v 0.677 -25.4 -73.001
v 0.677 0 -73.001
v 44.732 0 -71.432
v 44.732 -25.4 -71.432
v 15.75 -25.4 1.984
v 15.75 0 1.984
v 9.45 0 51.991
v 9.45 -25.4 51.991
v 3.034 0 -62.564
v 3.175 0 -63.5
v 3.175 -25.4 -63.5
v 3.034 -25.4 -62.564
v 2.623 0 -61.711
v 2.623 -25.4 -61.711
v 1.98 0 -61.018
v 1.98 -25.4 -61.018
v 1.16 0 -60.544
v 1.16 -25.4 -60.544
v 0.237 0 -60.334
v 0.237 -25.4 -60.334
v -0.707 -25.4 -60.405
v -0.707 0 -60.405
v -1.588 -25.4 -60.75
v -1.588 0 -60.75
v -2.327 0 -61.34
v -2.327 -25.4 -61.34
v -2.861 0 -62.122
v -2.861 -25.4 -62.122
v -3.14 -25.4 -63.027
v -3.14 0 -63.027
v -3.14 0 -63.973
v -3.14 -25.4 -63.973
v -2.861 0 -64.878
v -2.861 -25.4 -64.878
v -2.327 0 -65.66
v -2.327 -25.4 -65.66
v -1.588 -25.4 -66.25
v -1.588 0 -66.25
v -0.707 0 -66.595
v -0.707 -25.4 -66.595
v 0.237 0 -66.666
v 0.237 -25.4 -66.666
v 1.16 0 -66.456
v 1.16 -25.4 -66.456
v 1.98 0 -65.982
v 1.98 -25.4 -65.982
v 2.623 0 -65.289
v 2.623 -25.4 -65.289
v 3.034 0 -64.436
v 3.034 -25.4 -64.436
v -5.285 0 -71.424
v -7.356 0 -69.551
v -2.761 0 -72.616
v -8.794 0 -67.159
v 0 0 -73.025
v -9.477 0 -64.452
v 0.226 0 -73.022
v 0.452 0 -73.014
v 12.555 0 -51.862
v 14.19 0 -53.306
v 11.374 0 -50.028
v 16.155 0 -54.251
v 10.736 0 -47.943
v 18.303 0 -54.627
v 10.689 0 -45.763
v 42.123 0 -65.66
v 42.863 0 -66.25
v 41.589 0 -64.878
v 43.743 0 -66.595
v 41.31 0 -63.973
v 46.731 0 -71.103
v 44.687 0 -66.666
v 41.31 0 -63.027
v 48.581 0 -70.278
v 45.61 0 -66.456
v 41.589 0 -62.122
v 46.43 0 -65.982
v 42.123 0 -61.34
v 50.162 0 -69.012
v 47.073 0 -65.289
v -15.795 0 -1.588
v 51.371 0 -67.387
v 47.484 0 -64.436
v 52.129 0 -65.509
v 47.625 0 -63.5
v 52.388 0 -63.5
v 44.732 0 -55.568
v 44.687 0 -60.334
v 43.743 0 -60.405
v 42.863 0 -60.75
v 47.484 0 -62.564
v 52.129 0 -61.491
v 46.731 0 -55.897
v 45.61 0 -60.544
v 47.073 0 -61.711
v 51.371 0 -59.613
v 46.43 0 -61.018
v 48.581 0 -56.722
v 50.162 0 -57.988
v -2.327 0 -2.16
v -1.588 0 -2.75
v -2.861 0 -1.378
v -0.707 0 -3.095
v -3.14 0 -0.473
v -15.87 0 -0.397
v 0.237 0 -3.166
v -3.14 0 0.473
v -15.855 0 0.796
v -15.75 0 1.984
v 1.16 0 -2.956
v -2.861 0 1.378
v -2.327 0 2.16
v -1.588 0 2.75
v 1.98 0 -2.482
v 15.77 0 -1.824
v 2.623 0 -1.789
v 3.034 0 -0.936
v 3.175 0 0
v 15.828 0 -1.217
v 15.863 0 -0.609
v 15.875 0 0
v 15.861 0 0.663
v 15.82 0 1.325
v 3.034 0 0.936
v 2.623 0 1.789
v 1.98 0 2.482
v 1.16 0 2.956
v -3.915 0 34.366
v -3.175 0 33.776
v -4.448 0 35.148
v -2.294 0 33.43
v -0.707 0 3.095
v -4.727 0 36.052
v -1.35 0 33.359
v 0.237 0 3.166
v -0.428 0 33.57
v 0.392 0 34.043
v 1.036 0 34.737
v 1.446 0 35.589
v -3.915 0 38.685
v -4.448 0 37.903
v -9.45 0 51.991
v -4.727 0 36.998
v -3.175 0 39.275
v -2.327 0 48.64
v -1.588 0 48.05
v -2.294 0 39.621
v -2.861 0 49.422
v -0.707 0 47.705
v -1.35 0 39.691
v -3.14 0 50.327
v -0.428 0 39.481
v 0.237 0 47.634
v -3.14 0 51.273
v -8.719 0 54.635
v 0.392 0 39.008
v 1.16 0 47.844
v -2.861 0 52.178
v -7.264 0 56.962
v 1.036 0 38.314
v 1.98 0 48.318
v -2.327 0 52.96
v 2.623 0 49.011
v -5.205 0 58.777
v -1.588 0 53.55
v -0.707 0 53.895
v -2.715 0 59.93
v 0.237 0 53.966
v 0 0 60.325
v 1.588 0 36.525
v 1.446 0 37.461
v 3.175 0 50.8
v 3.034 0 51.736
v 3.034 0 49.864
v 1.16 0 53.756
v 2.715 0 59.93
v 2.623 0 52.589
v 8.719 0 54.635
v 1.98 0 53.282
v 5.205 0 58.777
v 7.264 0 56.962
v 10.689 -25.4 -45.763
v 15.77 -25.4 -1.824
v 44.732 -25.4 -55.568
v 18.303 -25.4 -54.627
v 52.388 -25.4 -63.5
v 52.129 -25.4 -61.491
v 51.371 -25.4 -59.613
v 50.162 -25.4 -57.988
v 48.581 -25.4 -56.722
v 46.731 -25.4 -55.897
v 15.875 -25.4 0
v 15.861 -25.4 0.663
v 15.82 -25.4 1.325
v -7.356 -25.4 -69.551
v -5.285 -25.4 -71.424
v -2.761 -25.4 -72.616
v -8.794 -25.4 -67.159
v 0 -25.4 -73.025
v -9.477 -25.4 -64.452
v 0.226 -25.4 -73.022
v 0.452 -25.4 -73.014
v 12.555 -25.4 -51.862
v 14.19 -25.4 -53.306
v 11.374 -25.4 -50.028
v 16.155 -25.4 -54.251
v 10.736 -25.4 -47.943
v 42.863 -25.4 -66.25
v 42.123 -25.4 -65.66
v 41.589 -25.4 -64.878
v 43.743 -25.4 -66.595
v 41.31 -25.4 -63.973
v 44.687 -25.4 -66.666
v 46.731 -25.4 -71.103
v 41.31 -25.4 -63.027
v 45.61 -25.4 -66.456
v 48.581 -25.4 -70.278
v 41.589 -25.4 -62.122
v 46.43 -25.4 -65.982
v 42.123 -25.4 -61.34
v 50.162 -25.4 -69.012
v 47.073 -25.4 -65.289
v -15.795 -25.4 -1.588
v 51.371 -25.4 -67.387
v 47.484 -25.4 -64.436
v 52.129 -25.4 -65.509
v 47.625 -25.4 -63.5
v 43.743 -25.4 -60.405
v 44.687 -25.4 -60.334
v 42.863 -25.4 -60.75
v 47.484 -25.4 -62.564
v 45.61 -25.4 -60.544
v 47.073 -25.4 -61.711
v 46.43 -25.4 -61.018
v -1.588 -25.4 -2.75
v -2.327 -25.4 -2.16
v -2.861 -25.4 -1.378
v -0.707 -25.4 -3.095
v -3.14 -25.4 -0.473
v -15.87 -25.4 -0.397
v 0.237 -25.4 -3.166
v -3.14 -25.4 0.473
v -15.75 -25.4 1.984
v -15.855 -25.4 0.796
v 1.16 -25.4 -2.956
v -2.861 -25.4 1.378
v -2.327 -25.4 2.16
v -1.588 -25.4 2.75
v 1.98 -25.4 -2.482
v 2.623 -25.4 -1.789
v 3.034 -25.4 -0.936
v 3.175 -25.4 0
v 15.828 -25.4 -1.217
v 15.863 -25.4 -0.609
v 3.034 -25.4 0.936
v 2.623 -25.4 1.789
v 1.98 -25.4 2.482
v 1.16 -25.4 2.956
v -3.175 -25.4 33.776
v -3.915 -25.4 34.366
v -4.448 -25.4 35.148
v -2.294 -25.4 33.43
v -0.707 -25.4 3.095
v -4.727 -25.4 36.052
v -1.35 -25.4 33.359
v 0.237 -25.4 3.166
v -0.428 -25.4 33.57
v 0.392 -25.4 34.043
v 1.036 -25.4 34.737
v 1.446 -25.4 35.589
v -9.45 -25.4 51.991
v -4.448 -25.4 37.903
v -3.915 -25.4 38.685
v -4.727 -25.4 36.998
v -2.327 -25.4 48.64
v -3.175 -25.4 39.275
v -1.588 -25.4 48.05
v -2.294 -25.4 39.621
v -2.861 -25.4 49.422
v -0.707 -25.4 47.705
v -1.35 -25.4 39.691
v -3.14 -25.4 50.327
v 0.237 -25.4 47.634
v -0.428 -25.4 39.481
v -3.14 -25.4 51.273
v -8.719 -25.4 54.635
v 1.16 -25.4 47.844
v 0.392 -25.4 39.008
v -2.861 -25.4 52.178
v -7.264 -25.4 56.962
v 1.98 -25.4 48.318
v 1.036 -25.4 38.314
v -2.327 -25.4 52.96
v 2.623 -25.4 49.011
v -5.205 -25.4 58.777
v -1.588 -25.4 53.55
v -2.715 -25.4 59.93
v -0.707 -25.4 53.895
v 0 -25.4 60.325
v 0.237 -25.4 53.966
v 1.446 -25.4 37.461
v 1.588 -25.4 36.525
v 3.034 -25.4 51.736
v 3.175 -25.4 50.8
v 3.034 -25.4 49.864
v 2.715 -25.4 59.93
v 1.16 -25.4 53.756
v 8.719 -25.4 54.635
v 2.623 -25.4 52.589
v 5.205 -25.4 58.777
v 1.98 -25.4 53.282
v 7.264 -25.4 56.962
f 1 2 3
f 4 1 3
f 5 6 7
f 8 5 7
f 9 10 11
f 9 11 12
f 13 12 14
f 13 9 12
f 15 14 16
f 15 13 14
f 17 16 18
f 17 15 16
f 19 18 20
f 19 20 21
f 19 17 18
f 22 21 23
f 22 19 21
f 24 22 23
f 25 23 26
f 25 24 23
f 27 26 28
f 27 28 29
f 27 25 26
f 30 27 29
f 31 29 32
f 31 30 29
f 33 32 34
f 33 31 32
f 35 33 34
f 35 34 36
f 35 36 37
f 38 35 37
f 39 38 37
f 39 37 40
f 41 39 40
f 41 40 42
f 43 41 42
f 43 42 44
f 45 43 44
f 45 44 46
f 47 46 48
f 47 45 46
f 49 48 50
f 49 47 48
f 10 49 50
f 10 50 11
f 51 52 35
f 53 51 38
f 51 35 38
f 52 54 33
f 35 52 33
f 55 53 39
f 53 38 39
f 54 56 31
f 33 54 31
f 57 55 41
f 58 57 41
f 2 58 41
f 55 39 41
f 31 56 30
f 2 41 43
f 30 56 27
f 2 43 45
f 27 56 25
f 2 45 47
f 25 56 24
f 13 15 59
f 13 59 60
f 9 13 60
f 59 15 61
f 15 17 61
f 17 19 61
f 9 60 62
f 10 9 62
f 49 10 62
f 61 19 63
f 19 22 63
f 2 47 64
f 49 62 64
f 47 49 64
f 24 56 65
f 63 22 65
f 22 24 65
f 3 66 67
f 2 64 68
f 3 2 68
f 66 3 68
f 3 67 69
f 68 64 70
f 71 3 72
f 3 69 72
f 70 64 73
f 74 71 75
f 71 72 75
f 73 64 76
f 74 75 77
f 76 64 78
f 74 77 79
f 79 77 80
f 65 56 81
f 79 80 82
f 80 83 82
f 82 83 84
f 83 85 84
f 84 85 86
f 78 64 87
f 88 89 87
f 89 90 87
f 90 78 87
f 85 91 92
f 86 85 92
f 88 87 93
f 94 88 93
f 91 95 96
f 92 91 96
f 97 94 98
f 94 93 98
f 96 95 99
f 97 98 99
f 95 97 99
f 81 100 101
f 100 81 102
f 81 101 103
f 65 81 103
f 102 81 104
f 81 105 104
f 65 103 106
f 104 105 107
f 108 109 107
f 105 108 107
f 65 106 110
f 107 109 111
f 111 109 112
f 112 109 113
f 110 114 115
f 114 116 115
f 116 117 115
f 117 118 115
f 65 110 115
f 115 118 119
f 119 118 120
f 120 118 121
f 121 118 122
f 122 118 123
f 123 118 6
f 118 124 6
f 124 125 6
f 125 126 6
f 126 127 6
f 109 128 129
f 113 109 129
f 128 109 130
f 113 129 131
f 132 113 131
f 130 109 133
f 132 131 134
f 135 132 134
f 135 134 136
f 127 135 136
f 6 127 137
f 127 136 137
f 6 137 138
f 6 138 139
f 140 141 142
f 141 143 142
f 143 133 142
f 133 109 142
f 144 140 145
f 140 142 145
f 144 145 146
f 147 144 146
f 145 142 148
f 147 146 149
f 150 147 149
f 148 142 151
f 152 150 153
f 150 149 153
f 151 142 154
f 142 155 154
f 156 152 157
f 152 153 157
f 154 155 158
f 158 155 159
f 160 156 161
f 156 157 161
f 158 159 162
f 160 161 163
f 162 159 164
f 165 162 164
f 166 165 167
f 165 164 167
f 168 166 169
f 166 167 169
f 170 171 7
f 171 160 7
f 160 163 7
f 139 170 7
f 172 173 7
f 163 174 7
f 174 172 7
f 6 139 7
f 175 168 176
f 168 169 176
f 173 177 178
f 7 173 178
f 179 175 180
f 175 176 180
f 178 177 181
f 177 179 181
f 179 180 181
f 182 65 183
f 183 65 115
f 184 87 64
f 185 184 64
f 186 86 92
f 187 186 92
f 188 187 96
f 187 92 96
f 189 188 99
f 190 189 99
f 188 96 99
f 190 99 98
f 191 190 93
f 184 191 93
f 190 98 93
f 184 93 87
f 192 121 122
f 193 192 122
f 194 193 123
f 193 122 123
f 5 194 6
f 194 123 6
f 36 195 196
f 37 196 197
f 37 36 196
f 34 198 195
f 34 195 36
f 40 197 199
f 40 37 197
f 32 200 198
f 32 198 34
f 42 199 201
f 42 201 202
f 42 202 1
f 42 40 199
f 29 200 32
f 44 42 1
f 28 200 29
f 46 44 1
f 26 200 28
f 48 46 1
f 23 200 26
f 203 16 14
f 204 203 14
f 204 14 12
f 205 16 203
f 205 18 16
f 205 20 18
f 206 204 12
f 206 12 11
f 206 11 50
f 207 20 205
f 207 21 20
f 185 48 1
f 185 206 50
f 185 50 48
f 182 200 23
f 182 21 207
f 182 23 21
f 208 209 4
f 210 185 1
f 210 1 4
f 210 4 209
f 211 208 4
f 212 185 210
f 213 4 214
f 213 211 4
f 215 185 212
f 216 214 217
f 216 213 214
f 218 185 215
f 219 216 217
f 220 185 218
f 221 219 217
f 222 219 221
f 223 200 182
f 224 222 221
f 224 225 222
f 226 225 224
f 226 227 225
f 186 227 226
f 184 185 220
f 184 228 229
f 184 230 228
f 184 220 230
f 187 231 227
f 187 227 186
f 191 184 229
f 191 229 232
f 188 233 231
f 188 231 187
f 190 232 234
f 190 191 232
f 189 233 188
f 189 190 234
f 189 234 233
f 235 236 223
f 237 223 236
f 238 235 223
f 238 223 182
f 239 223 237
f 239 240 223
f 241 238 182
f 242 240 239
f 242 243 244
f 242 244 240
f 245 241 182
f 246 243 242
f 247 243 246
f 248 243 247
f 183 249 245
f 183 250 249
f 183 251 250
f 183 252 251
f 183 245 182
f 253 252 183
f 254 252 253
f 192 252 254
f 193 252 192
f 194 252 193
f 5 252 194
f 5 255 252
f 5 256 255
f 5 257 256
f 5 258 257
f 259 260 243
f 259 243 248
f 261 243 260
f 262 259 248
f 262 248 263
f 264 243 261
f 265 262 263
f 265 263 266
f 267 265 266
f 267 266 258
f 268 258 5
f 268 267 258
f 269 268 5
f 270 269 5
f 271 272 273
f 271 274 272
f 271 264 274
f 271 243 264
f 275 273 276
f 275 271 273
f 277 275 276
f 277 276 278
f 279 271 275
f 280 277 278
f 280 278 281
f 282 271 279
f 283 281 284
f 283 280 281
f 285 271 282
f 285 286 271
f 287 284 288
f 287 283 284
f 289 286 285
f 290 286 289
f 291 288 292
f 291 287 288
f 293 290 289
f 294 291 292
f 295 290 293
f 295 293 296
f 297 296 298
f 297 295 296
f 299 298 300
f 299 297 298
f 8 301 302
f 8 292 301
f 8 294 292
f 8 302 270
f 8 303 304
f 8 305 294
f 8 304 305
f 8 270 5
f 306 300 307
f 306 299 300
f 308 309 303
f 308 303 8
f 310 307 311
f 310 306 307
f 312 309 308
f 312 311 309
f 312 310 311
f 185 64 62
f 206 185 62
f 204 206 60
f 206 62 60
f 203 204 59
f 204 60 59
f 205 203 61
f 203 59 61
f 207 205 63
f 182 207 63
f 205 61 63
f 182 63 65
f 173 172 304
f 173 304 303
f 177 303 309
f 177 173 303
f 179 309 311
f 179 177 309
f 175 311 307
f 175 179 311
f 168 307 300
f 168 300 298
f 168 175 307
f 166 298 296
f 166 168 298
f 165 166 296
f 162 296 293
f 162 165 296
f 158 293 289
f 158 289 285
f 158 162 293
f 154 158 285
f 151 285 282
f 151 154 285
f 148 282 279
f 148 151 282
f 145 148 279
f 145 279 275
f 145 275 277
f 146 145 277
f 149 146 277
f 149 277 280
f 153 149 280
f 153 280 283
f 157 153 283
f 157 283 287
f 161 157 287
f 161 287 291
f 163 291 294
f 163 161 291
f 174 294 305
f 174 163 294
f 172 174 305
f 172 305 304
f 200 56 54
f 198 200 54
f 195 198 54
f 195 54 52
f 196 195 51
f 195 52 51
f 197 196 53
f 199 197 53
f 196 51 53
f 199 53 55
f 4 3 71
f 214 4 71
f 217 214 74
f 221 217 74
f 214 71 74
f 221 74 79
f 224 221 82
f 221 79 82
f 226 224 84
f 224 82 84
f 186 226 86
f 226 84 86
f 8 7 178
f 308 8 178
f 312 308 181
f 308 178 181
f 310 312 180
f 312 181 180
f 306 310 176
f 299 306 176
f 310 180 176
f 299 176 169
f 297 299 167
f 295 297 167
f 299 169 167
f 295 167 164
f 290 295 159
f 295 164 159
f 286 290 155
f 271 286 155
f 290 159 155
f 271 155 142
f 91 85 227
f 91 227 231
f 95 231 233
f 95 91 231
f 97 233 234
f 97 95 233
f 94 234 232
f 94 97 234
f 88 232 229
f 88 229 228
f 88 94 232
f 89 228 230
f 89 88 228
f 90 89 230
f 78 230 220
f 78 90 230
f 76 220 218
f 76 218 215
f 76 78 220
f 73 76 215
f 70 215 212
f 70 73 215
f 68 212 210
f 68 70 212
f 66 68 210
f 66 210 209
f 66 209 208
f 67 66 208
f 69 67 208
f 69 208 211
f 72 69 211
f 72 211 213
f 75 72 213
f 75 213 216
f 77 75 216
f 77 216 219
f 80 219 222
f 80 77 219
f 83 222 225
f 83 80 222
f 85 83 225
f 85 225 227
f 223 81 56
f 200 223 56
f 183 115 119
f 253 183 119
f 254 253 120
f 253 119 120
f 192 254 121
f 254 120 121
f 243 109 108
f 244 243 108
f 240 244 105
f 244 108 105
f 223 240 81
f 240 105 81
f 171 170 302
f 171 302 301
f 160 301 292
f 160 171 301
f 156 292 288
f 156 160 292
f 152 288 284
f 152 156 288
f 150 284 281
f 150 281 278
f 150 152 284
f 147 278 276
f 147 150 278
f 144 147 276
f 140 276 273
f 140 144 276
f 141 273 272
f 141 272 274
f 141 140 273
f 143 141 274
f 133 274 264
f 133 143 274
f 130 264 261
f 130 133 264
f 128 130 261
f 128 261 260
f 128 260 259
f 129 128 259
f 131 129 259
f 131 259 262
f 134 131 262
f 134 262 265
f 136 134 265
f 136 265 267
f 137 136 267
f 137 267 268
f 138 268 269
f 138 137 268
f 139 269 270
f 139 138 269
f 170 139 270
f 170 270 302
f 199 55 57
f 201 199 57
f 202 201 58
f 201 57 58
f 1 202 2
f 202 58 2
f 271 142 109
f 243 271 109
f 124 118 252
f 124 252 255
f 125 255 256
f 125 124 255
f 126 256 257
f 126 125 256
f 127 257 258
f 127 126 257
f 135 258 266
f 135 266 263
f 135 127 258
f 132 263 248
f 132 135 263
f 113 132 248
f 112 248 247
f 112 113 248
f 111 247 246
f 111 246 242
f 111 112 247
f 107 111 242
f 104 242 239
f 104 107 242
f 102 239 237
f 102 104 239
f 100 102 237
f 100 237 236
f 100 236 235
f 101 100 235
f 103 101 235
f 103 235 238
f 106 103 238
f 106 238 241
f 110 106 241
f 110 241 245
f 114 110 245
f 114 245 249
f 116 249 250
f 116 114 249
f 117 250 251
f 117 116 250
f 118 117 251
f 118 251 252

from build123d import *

# Parameters (mm, degrees)
F0_R     = 3.175
F1_DEPTH = 25.4


with BuildPart() as f1:
    # F0 (on Front) → F1 (new body)
    with BuildSketch(Plane.XZ):
        with BuildLine():
            ThreePointArc((15.769913, -1.823585), (15.848707, -0.913305), (15.875, 0))
            ThreePointArc((15.875, 0), (15.843841, 0.994139), (15.750488, 1.984375))
            ThreePointArc((15.750488, 1.984375), (0, 15.875), (-15.750488, 1.984375))
            ThreePointArc((-15.750488, 1.984375), (-15.873744, 0.199705), (-15.795426, -1.5875))
            ThreePointArc((-15.795426, -1.5875), (-0.11873, -15.874556), (15.769913, -1.823585))
        make_face()
        Circle(F0_R, mode=Mode.SUBTRACT)
        with BuildLine():
            ThreePointArc((-15.750488, 1.984375), (0, 15.875), (15.750488, 1.984375))
            Line((15.750488, 1.984375), (9.450293, 51.990625))
            ThreePointArc((9.450293, 51.990625), (9.506305, 51.396483), (9.525, 50.8))
            ThreePointArc((9.525, 50.8), (-0.596483, 41.293695), (-9.450293, 51.990625))
            Line((-9.450293, 51.990625), (-15.750488, 1.984375))
        make_face()
        with Locations((-1.5875, 36.5252)):
            Circle(F0_R, mode=Mode.SUBTRACT)
        with BuildLine():
            Line((10.688919, -45.762768), (15.769913, -1.823585))
            ThreePointArc((15.769913, -1.823585), (-0.11873, -15.874556), (-15.795426, -1.5875))
            Line((-15.795426, -1.5875), (-9.477255, -64.4525))
            ThreePointArc((-9.477255, -64.4525), (-0.476848, -53.986944), (9.525, -63.5))
            ThreePointArc((9.525, -63.5), (6.970557, -69.991299), (0.677344, -73.000886))
            Line((0.677344, -73.000886), (44.732405, -71.432475))
            ThreePointArc((44.732405, -71.432475), (36.5125, -63.5), (44.732405, -55.567525))
            Line((44.732405, -55.567525), (18.303005, -54.626608))
            ThreePointArc((18.303005, -54.626608), (12.555174, -51.861835), (10.688919, -45.762768))
        make_face()
        with BuildLine():
            ThreePointArc((9.525, 50.8), (9.506305, 51.396483), (9.450293, 51.990625))
            ThreePointArc((9.450293, 51.990625), (0, 60.325), (-9.450293, 51.990625))
            ThreePointArc((-9.450293, 51.990625), (-0.596483, 41.293695), (9.525, 50.8))
        make_face()
        with Locations((0, 50.8)):
            Circle(F0_R, mode=Mode.SUBTRACT)
        with BuildLine():
            ThreePointArc((9.525, -63.5), (-0.476848, -53.986944), (-9.477255, -64.4525))
            ThreePointArc((-9.477255, -64.4525), (-6.389564, -70.563929), (0, -73.025))
            Line((0, -73.025), (0.677344, -73.000886))
            ThreePointArc((0.677344, -73.000886), (6.970557, -69.991299), (9.525, -63.5))
        make_face()
        with Locations((0, -63.5)):
            Circle(F0_R, mode=Mode.SUBTRACT)
        with BuildLine():
            Line((0.677344, -73.000886), (0, -73.025))
            ThreePointArc((0, -73.025), (0.338886, -73.01897), (0.677344, -73.000886))
        make_face()
        with BuildLine():
            ThreePointArc((52.3875, -63.5), (50.161633, -57.98809), (44.732405, -55.567525))
            ThreePointArc((44.732405, -55.567525), (36.5125, -63.5), (44.732405, -71.432475))
            ThreePointArc((44.732405, -71.432475), (50.161633, -69.01191), (52.3875, -63.5))
        make_face()
        with Locations((44.45, -63.5)):
            Circle(F0_R, mode=Mode.SUBTRACT)
    extrude(amount=F1_DEPTH)


solid = f1.part
